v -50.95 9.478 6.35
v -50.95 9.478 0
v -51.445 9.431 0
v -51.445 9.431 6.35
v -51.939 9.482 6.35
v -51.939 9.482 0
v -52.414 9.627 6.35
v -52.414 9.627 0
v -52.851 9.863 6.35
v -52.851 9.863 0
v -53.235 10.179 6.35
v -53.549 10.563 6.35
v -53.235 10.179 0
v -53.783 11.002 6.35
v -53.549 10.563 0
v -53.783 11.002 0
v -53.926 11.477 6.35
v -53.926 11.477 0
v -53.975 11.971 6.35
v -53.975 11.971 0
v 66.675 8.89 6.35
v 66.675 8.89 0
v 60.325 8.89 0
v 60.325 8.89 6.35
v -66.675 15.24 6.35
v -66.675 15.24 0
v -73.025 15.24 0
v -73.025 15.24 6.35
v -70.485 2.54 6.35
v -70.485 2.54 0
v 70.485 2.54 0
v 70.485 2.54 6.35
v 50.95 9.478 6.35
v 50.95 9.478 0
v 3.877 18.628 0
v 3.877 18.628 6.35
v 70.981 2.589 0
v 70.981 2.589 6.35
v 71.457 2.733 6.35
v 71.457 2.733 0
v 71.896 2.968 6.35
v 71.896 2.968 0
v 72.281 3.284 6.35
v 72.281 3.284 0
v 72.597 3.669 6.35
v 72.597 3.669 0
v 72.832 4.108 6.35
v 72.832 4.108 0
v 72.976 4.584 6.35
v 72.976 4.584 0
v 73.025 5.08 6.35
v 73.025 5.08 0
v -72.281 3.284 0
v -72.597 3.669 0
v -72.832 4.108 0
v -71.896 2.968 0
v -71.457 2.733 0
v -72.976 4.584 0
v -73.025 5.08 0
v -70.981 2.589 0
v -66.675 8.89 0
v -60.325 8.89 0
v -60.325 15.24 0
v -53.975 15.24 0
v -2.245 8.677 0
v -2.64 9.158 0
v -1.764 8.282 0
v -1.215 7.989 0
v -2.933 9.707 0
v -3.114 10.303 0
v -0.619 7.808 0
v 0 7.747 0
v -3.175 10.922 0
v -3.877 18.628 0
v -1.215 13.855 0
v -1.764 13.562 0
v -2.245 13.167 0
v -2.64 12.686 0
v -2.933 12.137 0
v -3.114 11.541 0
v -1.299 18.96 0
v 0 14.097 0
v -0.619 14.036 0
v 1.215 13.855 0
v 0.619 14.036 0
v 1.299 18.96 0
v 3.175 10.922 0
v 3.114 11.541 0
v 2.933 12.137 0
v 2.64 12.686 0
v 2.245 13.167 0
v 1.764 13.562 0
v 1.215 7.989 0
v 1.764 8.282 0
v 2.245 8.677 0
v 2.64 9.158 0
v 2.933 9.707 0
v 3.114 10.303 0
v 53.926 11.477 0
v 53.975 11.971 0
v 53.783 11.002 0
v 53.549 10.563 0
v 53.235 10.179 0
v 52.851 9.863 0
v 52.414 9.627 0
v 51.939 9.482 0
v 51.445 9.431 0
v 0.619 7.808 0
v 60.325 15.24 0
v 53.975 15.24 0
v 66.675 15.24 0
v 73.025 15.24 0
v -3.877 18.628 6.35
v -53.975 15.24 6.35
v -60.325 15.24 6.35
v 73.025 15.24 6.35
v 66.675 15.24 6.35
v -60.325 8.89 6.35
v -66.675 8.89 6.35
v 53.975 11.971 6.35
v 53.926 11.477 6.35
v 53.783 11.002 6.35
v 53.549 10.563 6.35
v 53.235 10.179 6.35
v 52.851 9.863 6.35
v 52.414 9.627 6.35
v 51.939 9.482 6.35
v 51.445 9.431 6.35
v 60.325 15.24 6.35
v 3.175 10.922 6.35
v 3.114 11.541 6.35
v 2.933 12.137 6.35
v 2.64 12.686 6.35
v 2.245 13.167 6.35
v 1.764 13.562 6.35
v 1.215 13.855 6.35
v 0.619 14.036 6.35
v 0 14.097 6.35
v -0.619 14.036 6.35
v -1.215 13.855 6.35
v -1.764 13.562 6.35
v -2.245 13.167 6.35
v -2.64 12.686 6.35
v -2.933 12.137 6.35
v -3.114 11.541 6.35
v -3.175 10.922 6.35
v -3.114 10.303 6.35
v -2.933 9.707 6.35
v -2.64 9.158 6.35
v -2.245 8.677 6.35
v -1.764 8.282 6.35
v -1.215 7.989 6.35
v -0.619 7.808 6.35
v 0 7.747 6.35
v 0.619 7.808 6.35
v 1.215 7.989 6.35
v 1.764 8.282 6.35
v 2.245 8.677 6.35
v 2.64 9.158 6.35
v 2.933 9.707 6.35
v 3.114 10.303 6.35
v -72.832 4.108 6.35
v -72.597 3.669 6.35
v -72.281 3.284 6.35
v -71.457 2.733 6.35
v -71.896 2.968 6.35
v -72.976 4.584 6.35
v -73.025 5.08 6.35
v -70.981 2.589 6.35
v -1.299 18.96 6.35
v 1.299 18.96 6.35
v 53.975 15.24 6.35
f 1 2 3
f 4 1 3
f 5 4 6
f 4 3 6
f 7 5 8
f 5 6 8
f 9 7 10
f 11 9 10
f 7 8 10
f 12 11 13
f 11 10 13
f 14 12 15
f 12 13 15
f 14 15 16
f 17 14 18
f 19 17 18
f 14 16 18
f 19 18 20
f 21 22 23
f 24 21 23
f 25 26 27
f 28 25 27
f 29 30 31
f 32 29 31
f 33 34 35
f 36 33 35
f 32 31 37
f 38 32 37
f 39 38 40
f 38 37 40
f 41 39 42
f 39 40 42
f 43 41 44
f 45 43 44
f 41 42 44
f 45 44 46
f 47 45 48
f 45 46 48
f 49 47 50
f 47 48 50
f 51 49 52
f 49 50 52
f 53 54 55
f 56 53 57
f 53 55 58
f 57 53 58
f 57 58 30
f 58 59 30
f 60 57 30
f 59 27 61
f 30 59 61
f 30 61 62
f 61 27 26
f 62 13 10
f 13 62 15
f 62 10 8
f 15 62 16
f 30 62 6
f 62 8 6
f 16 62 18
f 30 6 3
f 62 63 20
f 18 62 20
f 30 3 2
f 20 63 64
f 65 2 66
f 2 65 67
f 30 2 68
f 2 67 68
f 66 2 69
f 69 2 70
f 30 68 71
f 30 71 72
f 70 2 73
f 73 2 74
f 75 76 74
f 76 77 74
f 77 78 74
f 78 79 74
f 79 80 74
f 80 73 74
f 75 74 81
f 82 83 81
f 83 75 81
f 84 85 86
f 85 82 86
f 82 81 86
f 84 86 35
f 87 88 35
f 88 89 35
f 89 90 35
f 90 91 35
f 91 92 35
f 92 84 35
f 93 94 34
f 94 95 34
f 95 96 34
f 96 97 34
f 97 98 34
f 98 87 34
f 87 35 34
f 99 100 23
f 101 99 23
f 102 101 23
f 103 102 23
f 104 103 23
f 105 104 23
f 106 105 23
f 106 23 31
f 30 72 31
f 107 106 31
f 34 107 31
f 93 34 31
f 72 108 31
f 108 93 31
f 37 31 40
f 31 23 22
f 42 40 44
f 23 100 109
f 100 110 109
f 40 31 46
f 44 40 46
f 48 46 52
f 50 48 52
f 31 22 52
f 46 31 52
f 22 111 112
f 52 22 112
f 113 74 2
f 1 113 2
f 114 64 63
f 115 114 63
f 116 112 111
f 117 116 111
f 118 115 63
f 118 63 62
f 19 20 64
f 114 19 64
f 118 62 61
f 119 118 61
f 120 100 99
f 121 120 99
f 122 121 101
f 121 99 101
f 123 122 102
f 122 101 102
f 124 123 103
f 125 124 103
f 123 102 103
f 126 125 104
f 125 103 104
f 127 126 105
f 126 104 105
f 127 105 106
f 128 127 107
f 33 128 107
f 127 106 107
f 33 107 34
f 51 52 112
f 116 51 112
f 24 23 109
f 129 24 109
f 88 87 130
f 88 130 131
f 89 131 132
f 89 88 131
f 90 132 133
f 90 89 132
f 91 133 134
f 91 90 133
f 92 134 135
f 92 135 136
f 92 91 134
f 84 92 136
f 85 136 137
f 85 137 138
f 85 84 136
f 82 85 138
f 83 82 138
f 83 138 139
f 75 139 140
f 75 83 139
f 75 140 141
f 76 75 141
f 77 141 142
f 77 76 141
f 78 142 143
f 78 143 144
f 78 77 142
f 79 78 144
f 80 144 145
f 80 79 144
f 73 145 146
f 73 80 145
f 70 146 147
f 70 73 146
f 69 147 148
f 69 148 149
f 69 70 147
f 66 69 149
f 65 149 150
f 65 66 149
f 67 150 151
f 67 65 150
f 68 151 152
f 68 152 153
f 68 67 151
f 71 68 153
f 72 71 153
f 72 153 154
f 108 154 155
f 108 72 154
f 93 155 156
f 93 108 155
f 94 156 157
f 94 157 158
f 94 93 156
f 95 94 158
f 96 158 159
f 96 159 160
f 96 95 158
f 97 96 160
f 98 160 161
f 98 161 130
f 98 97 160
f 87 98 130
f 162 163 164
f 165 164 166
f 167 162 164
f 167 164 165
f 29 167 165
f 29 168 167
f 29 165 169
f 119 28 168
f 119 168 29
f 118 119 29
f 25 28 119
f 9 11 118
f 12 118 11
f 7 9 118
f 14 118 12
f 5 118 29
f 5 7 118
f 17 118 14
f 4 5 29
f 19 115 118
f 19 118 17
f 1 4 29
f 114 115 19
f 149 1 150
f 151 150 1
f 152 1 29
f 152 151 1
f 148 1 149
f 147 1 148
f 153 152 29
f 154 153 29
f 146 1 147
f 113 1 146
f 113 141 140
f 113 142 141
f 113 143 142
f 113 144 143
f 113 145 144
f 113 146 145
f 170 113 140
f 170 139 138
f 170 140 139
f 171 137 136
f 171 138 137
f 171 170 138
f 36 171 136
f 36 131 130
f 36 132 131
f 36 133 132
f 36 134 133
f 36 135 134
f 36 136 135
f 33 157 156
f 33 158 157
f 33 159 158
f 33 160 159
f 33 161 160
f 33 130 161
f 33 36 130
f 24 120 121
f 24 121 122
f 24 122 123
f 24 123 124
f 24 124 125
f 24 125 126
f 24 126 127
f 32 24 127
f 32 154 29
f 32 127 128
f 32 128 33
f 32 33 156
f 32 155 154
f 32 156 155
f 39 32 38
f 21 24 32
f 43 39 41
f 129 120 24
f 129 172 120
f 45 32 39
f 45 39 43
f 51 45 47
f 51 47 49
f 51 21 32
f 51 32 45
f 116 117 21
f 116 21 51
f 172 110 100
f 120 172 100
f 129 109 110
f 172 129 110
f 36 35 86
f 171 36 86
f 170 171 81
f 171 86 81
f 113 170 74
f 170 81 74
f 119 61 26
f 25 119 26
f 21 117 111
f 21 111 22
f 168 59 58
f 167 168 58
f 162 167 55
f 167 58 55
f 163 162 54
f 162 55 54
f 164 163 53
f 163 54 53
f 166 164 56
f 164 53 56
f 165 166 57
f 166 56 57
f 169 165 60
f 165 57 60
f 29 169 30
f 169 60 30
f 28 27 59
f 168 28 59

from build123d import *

# Parameters (mm, degrees)
SKETCH2_R      = 3.175
EXTRUDE1_DEPTH = 6.35


with BuildPart() as part:
    # Sketch2 → Extrude1 (new body)
    with BuildSketch(Plane.XY):
        with BuildLine():
            Line((-3.877238786, 18.628018312), (-50.950345152, 9.477933344))
            ThreePointArc((-50.950345152, 9.477933344), (-53.05063868, 10.011339949), (-53.975, 11.97126639))
            Line((-53.975, 11.97126639), (-53.975, 15.24))
            Line((-53.975, 15.24), (-60.325, 15.24))
            Line((-60.325, 15.24), (-60.325, 8.89))
            Line((-60.325, 8.89), (-66.675, 8.89))
            Line((-66.675, 8.89), (-66.675, 15.24))
            Line((-66.675, 15.24), (-73.025, 15.24))
            Line((-73.025, 15.24), (-73.025, 5.08))
            ThreePointArc((-73.025, 5.08), (-72.281051224, 3.283948776), (-70.485, 2.54))
            Line((-70.485, 2.54), (70.485, 2.54))
            ThreePointArc((70.485, 2.54), (72.281051224, 3.283948776), (73.025, 5.08))
            Line((73.025, 5.08), (73.025, 15.24))
            Line((73.025, 15.24), (66.675, 15.24))
            Line((66.675, 15.24), (66.675, 8.89))
            Line((66.675, 8.89), (60.325, 8.89))
            Line((60.325, 8.89), (60.325, 15.24))
            Line((60.325, 15.24), (53.975, 15.24))
            Line((53.975, 15.24), (53.975, 11.97126639))
            ThreePointArc((53.975, 11.97126639), (53.05063868, 10.011339949), (50.950345152, 9.477933344))
            Line((50.950345152, 9.477933344), (3.877238786, 18.628018312))
            ThreePointArc((3.877238786, 18.628018312), (0, 19.001353944), (-3.877238786, 18.628018312))
        make_face()
        with Locations((0, 10.922)):
            Circle(SKETCH2_R, mode=Mode.SUBTRACT)
    extrude(amount=EXTRUDE1_DEPTH)


solid = part.part
